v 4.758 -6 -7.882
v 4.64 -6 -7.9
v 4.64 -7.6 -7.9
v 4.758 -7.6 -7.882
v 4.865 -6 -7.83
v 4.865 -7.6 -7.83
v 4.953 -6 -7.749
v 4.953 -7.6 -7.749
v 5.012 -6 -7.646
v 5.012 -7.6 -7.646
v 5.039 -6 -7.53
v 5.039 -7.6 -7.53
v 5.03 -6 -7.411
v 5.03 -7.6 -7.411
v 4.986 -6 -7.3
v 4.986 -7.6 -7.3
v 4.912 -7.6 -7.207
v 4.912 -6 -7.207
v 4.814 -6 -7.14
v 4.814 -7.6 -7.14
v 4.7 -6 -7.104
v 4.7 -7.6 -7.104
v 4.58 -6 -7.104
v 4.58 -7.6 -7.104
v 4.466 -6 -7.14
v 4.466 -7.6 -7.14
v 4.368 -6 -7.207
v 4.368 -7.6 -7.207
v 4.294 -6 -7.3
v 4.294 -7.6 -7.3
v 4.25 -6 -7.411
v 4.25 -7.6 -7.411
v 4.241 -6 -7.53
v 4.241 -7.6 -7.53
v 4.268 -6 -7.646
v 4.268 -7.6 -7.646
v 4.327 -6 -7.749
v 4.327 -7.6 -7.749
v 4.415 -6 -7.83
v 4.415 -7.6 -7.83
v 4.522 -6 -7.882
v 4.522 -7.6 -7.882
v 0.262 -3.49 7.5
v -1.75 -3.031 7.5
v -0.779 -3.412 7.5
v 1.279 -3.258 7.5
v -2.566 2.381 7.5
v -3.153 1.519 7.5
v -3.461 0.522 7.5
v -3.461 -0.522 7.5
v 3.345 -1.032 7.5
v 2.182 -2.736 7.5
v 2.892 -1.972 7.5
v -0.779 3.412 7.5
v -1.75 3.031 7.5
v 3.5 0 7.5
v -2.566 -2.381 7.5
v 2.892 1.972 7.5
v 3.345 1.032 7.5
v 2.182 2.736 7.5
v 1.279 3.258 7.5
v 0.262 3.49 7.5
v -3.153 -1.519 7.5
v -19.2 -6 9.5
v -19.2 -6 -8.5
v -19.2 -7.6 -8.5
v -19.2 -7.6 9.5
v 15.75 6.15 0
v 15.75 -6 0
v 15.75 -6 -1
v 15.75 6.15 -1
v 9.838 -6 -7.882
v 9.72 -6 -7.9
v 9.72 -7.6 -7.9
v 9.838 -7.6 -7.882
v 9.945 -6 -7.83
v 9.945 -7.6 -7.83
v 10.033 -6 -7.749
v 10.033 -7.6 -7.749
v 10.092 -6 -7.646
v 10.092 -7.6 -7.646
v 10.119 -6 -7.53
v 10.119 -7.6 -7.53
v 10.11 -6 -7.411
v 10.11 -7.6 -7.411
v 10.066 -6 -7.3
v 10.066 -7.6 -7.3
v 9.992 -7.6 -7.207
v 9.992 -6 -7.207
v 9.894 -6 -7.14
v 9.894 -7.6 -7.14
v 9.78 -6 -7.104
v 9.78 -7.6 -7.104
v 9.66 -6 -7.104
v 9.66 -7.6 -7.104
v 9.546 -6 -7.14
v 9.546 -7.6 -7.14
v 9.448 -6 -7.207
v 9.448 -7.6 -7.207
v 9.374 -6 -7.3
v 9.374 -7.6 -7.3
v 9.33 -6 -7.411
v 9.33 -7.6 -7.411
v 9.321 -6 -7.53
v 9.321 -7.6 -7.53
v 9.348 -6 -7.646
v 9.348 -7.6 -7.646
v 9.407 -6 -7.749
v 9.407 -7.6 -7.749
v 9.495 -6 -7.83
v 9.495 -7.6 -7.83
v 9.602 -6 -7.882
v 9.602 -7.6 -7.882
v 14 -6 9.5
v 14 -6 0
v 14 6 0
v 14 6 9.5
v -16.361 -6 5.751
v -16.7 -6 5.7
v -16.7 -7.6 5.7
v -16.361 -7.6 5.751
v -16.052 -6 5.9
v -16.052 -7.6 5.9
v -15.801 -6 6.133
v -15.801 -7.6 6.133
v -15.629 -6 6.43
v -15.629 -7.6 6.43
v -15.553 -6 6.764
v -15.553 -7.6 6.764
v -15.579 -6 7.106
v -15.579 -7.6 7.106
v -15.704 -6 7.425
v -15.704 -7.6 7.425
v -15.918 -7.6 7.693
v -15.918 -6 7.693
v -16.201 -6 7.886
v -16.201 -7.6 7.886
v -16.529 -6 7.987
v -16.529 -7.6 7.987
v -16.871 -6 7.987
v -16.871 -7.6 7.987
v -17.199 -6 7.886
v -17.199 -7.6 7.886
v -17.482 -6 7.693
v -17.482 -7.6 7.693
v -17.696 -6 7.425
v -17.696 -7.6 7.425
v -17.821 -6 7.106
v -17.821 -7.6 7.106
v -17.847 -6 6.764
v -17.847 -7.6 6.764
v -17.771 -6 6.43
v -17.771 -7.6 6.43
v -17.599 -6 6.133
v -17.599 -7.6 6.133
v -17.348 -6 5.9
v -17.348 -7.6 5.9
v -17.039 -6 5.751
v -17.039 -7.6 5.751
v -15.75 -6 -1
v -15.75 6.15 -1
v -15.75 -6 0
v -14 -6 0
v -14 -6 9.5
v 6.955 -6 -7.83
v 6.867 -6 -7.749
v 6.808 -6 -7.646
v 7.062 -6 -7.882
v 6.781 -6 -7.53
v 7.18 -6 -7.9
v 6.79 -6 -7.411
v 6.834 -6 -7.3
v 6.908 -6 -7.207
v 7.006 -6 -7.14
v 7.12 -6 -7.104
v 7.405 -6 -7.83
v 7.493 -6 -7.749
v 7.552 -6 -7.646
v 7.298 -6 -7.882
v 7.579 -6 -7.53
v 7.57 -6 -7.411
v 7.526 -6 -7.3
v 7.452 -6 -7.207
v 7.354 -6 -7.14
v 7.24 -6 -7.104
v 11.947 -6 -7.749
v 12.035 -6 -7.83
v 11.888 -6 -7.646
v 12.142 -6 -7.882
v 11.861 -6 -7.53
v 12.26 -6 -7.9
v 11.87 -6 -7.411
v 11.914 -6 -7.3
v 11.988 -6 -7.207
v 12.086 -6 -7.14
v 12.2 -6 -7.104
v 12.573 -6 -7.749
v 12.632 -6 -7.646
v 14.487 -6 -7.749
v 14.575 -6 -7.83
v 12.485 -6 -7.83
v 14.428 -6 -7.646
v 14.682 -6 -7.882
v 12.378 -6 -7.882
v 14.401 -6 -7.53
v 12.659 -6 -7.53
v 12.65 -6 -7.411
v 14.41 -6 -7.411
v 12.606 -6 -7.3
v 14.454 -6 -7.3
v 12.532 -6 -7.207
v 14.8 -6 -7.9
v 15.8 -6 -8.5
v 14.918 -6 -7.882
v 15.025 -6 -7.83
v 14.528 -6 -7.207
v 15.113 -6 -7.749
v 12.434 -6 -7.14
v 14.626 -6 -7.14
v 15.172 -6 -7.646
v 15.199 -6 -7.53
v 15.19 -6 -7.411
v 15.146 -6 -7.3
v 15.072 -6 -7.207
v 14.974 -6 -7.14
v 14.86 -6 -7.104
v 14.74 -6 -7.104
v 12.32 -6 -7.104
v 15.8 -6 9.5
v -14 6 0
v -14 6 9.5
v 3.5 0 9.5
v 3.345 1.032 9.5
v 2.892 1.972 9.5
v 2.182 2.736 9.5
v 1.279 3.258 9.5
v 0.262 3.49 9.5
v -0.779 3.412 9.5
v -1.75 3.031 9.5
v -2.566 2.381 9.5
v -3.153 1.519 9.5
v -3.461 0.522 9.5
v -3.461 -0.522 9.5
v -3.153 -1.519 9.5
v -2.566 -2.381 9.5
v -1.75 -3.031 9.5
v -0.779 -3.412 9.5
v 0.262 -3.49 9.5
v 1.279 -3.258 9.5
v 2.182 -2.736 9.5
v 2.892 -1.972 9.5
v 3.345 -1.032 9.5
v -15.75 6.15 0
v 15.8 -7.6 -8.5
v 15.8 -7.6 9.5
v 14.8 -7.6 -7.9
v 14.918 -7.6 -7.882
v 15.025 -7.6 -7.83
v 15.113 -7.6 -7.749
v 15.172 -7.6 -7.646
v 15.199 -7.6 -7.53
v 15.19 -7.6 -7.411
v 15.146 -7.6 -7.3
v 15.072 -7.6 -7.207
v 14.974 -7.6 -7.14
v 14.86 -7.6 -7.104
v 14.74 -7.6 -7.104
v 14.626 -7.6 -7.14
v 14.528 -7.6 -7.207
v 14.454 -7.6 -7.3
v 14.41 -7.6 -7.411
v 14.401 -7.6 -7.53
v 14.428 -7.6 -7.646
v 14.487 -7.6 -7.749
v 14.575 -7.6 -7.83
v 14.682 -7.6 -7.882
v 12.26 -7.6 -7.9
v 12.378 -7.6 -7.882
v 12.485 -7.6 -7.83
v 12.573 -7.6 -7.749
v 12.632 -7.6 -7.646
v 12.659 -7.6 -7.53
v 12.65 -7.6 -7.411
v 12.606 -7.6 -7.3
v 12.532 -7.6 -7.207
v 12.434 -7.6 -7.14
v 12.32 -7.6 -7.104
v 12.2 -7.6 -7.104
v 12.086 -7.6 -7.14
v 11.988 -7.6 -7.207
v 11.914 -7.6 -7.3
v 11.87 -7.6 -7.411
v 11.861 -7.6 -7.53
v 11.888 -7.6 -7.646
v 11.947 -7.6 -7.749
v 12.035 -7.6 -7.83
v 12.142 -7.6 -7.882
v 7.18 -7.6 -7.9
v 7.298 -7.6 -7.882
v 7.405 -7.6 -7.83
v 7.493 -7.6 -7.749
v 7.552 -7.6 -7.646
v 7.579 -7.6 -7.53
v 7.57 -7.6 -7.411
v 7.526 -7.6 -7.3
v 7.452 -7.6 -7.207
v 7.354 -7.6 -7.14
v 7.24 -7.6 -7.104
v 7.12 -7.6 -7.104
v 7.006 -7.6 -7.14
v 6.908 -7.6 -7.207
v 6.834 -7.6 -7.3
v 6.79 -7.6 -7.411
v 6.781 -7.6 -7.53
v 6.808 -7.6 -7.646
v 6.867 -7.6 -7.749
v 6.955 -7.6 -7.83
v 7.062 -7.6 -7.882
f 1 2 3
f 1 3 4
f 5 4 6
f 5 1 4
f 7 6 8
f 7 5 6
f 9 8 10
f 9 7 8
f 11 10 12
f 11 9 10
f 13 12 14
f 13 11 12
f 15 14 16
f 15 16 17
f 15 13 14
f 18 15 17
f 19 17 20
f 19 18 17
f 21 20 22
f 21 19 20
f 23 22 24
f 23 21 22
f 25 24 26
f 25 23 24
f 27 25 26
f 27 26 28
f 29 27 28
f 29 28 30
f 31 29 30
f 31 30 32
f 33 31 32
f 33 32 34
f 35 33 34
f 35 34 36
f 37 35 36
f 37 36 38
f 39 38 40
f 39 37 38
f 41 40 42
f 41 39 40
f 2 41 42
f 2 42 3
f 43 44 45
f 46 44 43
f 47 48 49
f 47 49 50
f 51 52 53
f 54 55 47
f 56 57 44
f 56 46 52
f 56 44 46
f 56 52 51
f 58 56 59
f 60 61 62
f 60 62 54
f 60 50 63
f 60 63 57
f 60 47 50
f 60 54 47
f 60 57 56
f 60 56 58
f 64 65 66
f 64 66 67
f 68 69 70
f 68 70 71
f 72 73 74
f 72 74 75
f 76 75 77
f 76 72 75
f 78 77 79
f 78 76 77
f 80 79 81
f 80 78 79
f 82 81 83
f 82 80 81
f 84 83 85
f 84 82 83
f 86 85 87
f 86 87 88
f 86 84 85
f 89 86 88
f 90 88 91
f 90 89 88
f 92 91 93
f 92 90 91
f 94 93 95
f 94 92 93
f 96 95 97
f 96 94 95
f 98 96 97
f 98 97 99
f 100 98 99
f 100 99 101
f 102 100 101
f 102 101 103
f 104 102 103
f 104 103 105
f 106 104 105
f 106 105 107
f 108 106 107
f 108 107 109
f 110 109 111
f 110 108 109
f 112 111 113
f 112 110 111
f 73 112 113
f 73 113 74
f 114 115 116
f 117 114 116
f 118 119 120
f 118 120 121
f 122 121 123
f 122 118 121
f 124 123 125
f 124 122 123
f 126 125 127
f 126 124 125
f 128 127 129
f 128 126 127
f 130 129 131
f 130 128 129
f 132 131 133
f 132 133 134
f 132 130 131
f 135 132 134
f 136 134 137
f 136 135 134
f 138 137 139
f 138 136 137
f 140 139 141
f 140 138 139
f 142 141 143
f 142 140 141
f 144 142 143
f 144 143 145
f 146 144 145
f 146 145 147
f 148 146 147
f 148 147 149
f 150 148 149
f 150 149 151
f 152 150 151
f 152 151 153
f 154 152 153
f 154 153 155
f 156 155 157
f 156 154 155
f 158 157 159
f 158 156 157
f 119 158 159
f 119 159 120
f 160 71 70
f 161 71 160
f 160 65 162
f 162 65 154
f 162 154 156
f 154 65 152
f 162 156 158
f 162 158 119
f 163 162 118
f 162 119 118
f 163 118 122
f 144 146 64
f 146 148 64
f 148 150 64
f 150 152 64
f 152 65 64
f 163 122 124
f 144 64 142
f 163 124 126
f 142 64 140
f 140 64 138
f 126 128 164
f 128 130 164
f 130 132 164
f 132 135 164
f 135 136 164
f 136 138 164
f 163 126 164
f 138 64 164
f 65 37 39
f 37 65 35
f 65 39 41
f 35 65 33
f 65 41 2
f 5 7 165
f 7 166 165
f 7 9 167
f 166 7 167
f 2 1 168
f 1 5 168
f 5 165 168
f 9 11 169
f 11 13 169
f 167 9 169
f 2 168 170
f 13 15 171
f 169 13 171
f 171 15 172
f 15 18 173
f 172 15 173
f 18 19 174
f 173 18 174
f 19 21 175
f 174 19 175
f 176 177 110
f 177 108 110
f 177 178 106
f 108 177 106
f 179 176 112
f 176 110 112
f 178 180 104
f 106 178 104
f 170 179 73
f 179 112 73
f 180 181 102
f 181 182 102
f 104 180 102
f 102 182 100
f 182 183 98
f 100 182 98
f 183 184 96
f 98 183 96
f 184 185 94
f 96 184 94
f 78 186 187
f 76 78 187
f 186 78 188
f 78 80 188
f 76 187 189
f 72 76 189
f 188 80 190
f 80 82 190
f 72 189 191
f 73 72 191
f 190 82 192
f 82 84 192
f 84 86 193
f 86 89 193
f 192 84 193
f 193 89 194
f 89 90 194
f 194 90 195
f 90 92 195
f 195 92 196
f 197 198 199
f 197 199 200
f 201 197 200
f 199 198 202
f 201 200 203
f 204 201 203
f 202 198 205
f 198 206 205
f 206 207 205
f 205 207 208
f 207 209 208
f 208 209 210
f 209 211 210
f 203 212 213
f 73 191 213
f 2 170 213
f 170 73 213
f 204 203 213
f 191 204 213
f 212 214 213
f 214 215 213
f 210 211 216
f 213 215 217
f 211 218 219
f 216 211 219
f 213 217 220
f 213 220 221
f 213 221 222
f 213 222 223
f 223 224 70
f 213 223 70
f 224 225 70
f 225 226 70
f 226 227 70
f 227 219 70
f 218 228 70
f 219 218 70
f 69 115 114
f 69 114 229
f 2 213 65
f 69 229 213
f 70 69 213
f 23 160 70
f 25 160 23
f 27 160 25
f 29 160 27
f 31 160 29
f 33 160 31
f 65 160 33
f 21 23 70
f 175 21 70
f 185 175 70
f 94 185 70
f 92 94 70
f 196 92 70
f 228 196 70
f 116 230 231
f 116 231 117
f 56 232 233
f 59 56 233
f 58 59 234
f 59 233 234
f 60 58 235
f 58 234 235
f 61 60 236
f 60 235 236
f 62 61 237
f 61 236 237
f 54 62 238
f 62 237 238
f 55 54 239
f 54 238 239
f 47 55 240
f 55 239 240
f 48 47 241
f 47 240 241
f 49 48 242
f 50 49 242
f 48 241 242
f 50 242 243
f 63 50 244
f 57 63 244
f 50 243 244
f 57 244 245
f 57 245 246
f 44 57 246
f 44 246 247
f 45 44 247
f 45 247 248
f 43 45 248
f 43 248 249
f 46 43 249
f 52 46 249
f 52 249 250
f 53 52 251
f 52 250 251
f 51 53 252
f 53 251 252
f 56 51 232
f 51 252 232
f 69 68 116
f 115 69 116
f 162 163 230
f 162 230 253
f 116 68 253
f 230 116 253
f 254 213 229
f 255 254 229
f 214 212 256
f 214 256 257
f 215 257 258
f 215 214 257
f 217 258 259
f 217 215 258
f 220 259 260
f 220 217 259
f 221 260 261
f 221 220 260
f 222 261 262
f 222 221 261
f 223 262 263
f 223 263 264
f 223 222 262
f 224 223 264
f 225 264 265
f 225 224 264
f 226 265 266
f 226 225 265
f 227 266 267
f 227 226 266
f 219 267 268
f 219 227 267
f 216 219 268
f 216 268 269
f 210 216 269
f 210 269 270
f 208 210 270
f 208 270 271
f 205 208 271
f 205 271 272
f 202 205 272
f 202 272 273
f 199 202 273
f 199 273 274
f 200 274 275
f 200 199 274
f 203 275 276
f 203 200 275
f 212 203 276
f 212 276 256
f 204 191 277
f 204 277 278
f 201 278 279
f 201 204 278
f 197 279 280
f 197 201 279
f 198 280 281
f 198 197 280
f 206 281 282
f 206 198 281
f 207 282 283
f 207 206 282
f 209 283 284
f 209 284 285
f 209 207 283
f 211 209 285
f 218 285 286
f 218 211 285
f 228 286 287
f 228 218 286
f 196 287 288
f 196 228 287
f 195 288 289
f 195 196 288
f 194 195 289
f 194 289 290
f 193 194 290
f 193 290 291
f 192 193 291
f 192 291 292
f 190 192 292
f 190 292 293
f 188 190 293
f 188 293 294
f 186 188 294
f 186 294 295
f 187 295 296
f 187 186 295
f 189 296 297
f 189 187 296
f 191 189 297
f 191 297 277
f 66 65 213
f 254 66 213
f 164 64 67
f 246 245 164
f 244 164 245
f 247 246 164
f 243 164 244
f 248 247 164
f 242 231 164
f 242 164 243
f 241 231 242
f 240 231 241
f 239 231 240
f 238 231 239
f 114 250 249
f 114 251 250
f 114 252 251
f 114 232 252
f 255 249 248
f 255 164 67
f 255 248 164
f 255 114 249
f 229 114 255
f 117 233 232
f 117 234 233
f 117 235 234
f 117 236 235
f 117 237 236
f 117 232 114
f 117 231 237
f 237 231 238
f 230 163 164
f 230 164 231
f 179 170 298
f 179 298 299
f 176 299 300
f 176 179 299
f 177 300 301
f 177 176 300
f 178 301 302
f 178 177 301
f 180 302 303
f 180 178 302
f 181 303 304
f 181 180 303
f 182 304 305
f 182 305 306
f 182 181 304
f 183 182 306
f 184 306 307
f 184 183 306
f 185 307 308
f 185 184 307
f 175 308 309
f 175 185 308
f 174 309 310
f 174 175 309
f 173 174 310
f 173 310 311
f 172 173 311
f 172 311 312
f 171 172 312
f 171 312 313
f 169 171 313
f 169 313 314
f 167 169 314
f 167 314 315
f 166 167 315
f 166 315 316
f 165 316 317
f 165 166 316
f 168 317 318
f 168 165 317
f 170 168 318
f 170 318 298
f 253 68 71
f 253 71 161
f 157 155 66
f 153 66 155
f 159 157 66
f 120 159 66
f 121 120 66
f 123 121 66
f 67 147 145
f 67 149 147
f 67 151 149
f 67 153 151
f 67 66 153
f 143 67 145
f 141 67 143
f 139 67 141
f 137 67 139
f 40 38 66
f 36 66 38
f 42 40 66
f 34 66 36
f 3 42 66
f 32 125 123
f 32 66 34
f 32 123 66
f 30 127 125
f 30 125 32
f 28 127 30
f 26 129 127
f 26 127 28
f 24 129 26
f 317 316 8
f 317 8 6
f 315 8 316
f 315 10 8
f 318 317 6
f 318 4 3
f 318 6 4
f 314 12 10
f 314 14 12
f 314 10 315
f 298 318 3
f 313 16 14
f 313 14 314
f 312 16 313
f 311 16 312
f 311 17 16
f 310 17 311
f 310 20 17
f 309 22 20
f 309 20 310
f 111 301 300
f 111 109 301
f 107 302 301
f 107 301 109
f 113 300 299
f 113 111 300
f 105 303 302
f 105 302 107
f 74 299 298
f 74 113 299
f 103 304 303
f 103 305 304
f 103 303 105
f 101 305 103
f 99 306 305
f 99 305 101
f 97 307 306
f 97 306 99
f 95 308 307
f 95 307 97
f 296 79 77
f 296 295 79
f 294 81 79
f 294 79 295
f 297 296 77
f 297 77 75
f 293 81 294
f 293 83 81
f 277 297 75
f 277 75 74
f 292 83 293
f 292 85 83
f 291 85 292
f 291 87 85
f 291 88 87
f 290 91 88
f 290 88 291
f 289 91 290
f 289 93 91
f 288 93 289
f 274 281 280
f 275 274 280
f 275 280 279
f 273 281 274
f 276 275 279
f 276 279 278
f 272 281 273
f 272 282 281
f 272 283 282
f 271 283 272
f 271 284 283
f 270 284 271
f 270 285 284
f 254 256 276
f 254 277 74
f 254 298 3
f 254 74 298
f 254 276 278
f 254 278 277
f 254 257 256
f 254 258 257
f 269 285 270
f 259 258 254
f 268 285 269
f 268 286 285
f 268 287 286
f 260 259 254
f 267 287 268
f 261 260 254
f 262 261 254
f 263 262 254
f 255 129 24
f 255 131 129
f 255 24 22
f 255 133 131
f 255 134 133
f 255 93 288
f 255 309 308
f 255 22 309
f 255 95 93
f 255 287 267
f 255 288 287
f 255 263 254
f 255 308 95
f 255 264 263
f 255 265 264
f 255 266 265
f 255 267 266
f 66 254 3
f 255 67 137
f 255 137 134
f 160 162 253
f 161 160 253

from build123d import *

# Parameters (mm, degrees)
SKETCH_2_W          = 28
SKETCH_2_H          = 12
EXTRUDE_1_DEPTH     = 9.5
SKETCH_3_W          = 31.5
SKETCH_3_H          = 12.3
EXTRUDE_2_DEPTH     = 1
SKETCH_4_W          = 35
SKETCH_4_H          = 18
SKETCH_4_R          = 1.15
SKETCH_4_R_2        = 0.4
EXTRUDE_3_DEPTH     = 1.6
SKETCH_6_R          = 3.5
CUT_EXTRUDE_1_DEPTH = 2


with BuildPart() as part:
    # 草图2 → 凸台-拉伸1 (new body)
    with BuildSketch(Plane.XY):
        Rectangle(SKETCH_2_W, SKETCH_2_H)
    extrude(amount=EXTRUDE_1_DEPTH)

    # 草图3 → 凸台-拉伸2 (add)
    with BuildSketch(Plane(origin=(0, 0, 0), x_dir=(-1, 0, 0), z_dir=(0, 0, -1))):
        Rectangle(SKETCH_3_W, SKETCH_3_H)
    extrude(amount=EXTRUDE_2_DEPTH)

    # 草图4 → 凸台-拉伸3 (add)
    with BuildSketch(Plane.XZ.offset(6)):
        with Locations((-1.7, 0.5)):
            Rectangle(SKETCH_4_W, SKETCH_4_H)
        with Locations(Location((-16.7, 6.85, 0), (0, 0, 270))):
            Circle(SKETCH_4_R, mode=Mode.SUBTRACT)
        with Locations(Location((14.8, -7.5, 0), (0, 0, 270))):
            Circle(SKETCH_4_R_2, mode=Mode.SUBTRACT)
        with Locations(Location((12.26, -7.5, 0), (0, 0, 270))):
            Circle(SKETCH_4_R_2, mode=Mode.SUBTRACT)
        with Locations(Location((9.72, -7.5, 0), (0, 0, 270))):
            Circle(SKETCH_4_R_2, mode=Mode.SUBTRACT)
        with Locations(Location((7.18, -7.5, 0), (0, 0, 270))):
            Circle(SKETCH_4_R_2, mode=Mode.SUBTRACT)
        with Locations(Location((4.64, -7.5, 0), (0, 0, 270))):
            Circle(SKETCH_4_R_2, mode=Mode.SUBTRACT)
    extrude(amount=EXTRUDE_3_DEPTH)

    # 草图6 → 切除-拉伸1 (cut)
    with BuildSketch(Plane.XY.offset(9.5)):
        Circle(SKETCH_6_R)
    extrude(amount=-CUT_EXTRUDE_1_DEPTH, mode=Mode.SUBTRACT)


solid = part.part
